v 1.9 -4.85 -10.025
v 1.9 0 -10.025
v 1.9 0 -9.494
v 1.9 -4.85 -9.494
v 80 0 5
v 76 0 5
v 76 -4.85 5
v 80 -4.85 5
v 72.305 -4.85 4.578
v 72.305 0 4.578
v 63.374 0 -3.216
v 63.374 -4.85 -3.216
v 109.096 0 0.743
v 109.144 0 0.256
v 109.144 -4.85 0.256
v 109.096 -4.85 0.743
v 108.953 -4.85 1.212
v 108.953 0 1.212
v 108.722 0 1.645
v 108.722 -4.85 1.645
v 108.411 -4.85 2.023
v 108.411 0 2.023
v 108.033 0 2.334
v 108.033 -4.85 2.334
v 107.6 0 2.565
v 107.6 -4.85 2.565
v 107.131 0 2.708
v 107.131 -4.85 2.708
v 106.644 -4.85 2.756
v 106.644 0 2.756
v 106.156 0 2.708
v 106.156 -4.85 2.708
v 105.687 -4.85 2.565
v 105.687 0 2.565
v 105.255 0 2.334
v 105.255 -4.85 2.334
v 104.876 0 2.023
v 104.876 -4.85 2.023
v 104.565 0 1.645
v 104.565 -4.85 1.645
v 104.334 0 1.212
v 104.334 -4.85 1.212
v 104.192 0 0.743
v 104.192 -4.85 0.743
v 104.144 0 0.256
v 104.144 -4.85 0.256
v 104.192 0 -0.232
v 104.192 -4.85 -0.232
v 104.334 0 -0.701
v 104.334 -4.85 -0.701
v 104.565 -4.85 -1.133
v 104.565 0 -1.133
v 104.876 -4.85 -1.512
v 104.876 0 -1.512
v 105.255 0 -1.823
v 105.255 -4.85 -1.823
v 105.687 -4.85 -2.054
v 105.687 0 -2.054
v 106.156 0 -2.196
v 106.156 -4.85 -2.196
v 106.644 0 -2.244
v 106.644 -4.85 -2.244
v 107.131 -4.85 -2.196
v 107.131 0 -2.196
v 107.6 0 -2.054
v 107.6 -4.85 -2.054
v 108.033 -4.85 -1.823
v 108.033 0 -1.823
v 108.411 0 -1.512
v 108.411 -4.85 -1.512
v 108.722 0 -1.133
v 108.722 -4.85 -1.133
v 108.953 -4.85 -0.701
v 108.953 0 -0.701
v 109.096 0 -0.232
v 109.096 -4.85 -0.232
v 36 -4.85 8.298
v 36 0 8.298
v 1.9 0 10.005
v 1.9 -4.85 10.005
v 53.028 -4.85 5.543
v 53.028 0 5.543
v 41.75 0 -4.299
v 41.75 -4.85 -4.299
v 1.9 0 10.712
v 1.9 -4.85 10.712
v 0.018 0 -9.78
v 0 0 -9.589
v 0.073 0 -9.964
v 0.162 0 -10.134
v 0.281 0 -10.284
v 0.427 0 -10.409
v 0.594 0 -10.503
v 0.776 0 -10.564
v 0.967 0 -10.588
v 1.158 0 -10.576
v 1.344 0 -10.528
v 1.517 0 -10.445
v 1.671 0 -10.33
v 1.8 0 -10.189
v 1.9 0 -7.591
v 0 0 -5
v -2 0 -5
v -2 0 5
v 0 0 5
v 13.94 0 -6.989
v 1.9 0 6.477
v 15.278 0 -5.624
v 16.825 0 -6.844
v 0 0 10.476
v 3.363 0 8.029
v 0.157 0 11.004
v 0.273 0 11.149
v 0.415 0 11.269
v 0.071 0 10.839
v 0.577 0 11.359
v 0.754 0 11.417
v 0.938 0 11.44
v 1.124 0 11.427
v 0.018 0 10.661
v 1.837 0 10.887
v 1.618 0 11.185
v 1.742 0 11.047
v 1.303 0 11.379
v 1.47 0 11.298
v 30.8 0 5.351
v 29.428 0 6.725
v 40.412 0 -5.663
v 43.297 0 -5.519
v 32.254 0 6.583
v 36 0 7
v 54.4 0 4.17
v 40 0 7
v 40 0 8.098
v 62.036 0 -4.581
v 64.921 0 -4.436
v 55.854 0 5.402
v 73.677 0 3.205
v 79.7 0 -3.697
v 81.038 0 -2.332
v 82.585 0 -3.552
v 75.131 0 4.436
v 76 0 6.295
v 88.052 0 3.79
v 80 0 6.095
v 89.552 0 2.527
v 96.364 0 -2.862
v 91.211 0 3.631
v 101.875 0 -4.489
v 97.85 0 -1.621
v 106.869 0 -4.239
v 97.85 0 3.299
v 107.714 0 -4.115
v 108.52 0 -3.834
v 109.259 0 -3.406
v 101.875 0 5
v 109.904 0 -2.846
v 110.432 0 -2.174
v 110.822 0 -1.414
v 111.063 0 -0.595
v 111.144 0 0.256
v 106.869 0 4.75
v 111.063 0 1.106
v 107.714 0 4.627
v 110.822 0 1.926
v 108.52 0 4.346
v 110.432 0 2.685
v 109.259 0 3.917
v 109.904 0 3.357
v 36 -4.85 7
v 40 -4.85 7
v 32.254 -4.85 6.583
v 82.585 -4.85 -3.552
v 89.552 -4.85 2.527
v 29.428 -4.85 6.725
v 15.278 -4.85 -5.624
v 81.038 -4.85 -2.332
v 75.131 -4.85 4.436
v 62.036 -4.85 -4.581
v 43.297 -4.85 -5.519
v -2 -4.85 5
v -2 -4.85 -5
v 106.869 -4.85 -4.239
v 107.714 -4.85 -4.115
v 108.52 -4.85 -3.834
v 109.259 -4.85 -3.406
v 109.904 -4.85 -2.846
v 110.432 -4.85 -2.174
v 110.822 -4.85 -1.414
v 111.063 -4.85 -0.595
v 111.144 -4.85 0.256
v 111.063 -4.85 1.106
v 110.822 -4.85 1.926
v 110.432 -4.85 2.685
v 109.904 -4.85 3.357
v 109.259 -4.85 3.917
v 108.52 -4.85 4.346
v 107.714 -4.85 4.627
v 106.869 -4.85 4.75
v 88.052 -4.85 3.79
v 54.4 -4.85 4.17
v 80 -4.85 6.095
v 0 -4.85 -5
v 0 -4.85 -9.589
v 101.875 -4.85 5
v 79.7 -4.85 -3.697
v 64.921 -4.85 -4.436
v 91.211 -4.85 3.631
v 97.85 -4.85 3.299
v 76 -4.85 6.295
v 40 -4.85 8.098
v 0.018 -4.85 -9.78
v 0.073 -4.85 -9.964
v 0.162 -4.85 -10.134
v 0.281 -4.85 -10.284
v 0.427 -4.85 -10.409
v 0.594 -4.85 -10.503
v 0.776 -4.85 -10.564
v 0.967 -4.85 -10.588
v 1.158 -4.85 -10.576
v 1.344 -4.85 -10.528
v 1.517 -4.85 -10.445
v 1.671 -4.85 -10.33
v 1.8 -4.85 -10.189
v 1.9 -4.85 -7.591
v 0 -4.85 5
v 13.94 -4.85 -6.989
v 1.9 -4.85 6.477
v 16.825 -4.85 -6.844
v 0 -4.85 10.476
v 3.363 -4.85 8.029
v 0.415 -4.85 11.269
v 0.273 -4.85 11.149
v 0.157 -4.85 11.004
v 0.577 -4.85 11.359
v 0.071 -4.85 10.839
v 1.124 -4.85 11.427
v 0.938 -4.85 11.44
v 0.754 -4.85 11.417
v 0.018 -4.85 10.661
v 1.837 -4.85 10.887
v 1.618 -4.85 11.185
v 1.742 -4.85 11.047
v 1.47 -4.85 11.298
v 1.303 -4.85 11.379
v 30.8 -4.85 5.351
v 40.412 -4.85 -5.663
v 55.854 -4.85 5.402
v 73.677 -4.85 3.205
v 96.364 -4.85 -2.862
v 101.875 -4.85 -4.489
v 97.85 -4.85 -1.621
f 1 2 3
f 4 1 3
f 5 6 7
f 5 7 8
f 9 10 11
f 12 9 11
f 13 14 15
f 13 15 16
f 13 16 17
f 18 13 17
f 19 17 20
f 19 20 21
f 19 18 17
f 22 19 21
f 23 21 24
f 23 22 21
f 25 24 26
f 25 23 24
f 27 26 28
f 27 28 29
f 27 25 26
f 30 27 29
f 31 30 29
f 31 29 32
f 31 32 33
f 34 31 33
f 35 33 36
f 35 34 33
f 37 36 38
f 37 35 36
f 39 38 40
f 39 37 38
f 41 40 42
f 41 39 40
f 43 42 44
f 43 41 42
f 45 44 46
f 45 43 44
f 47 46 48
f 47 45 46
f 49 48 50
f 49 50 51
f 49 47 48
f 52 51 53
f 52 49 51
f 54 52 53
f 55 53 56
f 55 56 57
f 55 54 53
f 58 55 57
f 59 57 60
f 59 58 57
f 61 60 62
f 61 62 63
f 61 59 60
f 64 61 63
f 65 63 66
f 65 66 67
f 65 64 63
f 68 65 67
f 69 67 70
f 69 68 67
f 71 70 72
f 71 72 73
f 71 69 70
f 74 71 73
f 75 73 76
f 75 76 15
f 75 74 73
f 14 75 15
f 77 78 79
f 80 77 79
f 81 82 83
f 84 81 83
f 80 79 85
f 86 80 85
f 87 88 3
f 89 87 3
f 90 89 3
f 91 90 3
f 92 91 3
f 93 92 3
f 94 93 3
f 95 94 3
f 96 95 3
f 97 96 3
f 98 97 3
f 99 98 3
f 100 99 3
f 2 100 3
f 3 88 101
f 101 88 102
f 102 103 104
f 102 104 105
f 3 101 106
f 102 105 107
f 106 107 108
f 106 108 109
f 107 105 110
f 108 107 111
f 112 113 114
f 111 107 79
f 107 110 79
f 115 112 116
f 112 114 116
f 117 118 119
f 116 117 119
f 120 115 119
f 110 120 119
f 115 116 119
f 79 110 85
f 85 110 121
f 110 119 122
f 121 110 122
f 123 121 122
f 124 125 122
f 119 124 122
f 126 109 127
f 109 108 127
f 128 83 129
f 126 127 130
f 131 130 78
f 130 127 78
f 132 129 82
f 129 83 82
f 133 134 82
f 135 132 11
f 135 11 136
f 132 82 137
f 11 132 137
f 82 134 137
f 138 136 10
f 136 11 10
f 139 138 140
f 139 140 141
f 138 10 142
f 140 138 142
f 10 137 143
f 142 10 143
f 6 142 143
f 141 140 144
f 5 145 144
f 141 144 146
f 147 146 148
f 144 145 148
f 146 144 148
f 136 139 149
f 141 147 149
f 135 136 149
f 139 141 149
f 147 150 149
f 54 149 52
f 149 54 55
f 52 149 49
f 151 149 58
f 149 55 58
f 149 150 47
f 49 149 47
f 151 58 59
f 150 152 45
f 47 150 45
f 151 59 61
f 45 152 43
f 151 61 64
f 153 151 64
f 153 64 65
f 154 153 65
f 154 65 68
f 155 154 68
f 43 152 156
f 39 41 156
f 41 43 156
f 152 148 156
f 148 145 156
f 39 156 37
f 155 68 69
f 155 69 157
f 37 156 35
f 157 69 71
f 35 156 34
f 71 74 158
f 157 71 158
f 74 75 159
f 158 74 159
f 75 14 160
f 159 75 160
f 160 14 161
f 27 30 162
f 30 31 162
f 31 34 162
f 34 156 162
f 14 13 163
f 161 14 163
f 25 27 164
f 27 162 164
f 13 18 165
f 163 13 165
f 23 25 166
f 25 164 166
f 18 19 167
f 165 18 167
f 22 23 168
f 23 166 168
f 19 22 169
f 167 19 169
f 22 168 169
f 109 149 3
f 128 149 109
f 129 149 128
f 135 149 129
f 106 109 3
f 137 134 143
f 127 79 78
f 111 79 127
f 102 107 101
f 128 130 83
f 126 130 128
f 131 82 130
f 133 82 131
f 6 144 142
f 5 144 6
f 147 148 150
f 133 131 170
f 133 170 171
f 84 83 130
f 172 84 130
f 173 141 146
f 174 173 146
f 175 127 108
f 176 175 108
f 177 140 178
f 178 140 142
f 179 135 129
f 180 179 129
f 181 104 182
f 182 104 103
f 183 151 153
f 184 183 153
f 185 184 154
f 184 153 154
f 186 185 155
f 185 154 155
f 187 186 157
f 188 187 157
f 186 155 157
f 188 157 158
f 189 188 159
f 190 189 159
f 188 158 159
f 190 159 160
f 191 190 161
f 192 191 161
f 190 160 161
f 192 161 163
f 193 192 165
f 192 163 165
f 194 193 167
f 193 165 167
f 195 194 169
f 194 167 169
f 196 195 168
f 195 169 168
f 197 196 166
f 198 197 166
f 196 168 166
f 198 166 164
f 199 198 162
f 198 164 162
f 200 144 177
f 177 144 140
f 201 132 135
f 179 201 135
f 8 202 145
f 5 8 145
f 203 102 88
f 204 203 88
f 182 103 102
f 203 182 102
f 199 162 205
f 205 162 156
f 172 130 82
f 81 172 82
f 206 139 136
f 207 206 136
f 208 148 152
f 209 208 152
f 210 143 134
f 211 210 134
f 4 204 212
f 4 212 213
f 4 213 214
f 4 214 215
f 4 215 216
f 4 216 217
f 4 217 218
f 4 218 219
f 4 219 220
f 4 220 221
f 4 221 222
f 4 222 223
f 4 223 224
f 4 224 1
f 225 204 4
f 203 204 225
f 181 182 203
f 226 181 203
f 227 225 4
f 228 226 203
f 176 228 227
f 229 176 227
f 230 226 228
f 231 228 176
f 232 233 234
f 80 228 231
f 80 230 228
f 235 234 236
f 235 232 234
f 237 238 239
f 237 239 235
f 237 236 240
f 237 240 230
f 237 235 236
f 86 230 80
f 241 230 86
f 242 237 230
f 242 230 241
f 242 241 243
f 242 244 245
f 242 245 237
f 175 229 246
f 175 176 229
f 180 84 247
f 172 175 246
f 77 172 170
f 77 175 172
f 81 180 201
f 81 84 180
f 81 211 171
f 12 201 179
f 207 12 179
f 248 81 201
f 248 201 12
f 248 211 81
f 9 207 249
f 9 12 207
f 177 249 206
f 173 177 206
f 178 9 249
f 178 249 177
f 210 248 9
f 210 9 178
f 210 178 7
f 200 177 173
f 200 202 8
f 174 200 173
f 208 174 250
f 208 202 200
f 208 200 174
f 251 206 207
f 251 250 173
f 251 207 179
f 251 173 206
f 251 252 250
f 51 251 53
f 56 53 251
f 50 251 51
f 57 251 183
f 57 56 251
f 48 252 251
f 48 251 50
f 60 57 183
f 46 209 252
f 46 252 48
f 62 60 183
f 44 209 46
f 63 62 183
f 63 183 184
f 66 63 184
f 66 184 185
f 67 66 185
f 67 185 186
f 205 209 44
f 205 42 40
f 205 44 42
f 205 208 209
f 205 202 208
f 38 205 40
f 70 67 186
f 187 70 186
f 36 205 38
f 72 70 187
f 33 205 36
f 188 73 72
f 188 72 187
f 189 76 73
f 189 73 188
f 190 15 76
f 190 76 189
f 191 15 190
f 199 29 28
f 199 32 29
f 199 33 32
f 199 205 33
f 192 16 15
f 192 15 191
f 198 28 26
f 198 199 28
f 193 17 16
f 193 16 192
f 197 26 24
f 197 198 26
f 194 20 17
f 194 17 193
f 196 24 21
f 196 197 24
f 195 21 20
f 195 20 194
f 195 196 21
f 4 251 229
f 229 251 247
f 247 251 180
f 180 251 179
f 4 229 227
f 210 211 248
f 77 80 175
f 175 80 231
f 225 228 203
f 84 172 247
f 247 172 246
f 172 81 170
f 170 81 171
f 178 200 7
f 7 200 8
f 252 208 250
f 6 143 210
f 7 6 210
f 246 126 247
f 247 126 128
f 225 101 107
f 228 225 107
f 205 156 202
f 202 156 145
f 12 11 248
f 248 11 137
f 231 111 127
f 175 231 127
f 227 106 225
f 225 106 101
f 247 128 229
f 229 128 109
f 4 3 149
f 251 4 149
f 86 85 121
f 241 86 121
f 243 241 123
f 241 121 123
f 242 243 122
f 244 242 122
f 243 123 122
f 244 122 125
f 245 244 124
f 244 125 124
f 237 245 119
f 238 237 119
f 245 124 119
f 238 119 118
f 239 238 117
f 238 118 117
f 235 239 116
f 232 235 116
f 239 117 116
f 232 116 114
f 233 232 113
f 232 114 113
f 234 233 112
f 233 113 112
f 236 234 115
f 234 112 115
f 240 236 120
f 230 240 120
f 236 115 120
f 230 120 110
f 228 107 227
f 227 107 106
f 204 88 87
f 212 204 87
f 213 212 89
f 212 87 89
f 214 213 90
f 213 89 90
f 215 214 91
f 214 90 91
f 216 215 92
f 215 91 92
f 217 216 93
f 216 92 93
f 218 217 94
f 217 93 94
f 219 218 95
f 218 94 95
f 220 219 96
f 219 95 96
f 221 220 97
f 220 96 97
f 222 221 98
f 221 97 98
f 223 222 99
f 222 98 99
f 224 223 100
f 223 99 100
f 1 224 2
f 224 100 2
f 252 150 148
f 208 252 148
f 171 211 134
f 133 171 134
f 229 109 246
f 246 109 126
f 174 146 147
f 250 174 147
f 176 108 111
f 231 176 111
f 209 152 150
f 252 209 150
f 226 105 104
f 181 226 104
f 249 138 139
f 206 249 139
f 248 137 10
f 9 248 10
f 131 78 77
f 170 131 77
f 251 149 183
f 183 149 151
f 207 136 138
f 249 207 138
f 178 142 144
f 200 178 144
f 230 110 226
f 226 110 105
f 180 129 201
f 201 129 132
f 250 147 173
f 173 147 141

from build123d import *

# Parameters (mm, degrees)
F0_R     = 2.5
F1_DEPTH = 4.85
F4_DEPTH = 3
F6_DEPTH = 5


with BuildPart() as f1:
    # F0 (on Front) → F1 (new body)
    with BuildSketch(Plane.XZ):
        with BuildLine():
            Line((0, 10.100125), (0, 5))
            Line((0, 5), (-2, 5))
            Line((-2, 5), (-2, -5))
            Line((-2, -5), (0, -5))
            Line((0, -5), (0, -9.588868))
            ThreePointArc((0, -9.588868), (0.776393, -10.563548), (1.9, -10.024758))
            Line((1.9, -10.024758), (1.9, -9.493749))
            Line((1.9, -9.493749), (101.874922, -4.488743))
            Line((101.874922, -4.488743), (106.868668, -4.238743))
            ThreePointArc((106.868668, -4.238743), (111.143668, 0.255629), (106.868668, 4.75))
            Line((106.868668, 4.75), (101.874922, 5))
            Line((101.874922, 5), (1.9, 10.005006))
            Line((1.9, 10.005006), (1.9, 10.71228))
            ThreePointArc((1.9, 10.71228), (0.845568, 11.433139), (0, 10.47581))
            Line((0, 10.47581), (0, 10.100125))
        make_face()
        Polygon((13.94009, -6.988611), (1.9, -7.59137), (1.9, 0.047531), (1.9, 6.476616), align=None, mode=Mode.SUBTRACT)
        Polygon((40.412243, -5.663346), (16.82521, -6.844175), (30.799962, 5.351317), align=None, mode=Mode.SUBTRACT)
        Polygon((43.297363, -5.518909), (54.399668, 4.169854), (62.036187, -4.580795), align=None, mode=Mode.SUBTRACT)
        Polygon((64.921308, -4.436358), (73.677236, 3.204768), (79.699843, -3.696506), align=None, mode=Mode.SUBTRACT)
        Polygon((89.5515, 2.52749), (96.364107, -2.862249), (82.584964, -3.552069), align=None, mode=Mode.SUBTRACT)
        with Locations((106.643668, 0.255629)):
            Circle(F0_R, mode=Mode.SUBTRACT)
        Polygon((15.278104, -5.623766), (3.363279, 8.029371), (29.427927, 6.724507), align=None, mode=Mode.SUBTRACT)
        Polygon((41.750257, -4.298501), (32.254169, 6.583018), (53.027633, 5.543044), align=None, mode=Mode.SUBTRACT)
        Polygon((72.305201, 4.577958), (63.374202, -3.21595), (55.853875, 5.401555), align=None, mode=Mode.SUBTRACT)
        Polygon((88.052204, 3.789622), (81.037857, -2.331661), (75.131443, 4.436469), align=None, mode=Mode.SUBTRACT)
        Polygon((91.211182, 3.631475), (97.850325, 3.299102), (97.850325, -1.621029), align=None, mode=Mode.SUBTRACT)
    extrude(amount=F1_DEPTH)

    # F3 (on offset) → F4 (cut)
    with BuildSketch(Plane.XY.offset(10)):
        Polygon((36, 0), (36, -2.5), (36, -5), (40, -5), (40, -2.5), (40, 0), align=None)
        Polygon((76, 0), (76, -2.5), (76, -5), (80, -5), (80, -2.5), (80, 0), align=None)
    extrude(amount=-F4_DEPTH, mode=Mode.SUBTRACT)

    # F5 (on offset) → F6 (cut)
    with BuildSketch(Plane.XY.offset(10)):
        Polygon((76, 0), (76, -2.5), (76, -5), (80, -5), (80, -2.5), (80, 0), align=None)
    extrude(amount=-F6_DEPTH, mode=Mode.SUBTRACT)


solid = f1.part
